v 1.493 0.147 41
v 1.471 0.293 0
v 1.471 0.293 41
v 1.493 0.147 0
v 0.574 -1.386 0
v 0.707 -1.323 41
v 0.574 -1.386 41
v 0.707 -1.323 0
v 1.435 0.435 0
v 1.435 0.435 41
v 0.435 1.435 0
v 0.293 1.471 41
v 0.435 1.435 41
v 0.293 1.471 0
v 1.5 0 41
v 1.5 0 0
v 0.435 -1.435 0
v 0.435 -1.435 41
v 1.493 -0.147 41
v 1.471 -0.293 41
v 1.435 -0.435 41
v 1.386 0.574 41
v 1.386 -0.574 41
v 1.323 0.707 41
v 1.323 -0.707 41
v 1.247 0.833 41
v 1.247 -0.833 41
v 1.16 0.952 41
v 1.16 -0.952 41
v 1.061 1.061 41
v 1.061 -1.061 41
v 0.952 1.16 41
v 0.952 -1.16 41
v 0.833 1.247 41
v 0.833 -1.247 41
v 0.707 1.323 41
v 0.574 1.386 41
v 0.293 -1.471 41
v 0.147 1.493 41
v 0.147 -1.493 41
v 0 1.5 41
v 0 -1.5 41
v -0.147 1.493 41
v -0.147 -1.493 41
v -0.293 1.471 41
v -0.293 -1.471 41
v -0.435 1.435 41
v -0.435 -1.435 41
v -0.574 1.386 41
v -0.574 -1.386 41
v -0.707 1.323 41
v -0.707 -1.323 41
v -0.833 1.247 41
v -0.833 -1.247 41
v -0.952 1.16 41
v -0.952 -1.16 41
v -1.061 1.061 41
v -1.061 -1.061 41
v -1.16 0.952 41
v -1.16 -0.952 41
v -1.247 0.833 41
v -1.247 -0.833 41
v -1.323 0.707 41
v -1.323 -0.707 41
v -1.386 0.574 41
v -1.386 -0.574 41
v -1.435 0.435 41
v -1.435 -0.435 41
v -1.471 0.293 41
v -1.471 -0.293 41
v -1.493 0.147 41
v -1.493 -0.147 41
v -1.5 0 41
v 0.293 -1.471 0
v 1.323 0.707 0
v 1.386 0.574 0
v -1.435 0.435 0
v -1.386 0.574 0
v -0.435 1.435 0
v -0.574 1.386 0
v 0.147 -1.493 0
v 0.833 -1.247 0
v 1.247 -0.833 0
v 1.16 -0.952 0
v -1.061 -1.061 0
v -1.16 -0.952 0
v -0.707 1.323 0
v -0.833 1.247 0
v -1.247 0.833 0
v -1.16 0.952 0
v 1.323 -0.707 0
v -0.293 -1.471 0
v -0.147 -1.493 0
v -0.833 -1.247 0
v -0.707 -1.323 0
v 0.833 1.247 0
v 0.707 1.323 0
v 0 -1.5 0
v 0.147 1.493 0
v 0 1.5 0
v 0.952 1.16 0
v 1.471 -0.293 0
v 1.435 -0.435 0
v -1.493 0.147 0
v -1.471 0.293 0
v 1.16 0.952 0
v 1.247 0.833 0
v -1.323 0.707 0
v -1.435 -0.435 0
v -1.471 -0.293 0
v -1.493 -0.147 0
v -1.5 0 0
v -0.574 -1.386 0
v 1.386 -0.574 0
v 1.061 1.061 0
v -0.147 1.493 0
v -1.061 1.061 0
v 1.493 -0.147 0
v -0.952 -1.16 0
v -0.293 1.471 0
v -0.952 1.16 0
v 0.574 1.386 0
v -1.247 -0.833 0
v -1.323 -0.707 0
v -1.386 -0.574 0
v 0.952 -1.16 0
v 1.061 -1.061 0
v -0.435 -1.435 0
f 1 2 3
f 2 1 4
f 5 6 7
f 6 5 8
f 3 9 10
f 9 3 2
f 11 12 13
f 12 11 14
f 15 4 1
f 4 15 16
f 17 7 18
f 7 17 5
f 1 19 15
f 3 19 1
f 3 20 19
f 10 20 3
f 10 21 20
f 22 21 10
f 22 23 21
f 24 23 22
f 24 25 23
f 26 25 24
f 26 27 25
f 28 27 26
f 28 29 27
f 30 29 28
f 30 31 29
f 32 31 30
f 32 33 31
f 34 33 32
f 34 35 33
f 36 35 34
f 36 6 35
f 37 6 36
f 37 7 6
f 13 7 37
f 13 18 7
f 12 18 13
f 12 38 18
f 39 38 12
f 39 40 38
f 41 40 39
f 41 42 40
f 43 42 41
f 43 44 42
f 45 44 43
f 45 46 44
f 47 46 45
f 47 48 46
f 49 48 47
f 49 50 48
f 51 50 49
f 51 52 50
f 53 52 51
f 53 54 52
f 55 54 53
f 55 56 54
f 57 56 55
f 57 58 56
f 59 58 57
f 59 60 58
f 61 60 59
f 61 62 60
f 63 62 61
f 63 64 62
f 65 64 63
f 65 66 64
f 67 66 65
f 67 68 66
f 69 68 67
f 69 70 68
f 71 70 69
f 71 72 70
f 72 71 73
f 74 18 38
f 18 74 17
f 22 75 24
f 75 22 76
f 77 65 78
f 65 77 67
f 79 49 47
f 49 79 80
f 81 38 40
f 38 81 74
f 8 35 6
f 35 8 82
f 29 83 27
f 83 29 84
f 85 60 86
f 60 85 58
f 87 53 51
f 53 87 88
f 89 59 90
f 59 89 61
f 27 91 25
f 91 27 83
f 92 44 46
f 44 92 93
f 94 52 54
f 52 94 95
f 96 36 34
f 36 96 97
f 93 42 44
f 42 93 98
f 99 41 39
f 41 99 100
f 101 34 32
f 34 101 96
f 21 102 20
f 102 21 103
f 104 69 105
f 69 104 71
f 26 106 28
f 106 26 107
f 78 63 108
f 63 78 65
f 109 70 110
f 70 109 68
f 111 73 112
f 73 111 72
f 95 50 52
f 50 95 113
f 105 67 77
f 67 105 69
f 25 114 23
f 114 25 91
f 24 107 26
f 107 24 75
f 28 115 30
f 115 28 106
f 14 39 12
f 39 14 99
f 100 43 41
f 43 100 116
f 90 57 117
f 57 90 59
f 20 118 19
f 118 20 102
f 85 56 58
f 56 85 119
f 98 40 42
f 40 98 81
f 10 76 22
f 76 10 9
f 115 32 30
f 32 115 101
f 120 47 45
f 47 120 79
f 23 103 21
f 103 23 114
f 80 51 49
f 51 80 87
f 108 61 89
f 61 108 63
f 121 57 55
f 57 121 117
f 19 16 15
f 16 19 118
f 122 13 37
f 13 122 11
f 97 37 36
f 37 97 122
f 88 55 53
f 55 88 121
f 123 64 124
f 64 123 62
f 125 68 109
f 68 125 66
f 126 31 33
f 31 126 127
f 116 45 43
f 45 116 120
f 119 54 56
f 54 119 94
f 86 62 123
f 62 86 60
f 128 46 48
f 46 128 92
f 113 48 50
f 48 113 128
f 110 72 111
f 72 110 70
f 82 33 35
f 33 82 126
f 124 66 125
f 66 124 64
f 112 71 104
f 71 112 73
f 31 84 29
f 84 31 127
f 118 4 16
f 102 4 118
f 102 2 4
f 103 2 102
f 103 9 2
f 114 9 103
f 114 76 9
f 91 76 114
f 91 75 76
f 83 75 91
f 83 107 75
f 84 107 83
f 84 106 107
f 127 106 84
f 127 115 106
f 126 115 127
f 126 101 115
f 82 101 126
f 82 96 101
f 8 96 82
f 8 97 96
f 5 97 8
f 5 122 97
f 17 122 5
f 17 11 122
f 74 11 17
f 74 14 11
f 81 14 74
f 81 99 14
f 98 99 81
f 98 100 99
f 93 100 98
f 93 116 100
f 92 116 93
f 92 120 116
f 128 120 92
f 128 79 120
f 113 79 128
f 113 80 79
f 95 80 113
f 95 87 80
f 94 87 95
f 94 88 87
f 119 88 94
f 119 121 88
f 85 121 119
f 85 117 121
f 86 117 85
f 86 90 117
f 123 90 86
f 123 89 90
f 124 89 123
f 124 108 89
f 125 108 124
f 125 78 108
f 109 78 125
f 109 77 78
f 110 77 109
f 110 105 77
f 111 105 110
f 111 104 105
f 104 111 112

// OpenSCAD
// Hose-barb Reducer Design
// Units: millimetres
// Orientation: Standing upright along Z, resting on XY plane at z=0

// --- Dimensions ---
// Main bore diameter (constant through the part)
$main_bore_d = 3.0;
$main_bore_r = $main_bore_d / 2;

// Section 1: 8mm Tubing Barbs (z = 0 to 20)
$z_start_1 = 0;
$z_end_1 = 20;
$barb_height_1 = 10;
$barb_od_bottom_1 = 7.5;
$barb_od_top_1 = 9.5;
$barb_count_1 = 2;

// Section 2: Collar (z = 20 to 25)
$z_start_2 = 20;
$z_end_2 = 25;
$collar_od = 12.0;
$collar_r = $collar_od / 2;

// Section 3: 5mm Tubing Barbs (z = 25 to 41)
$z_start_3 = 25;
$z_end_3 = 41;
$barb_height_3 = 8;
$barb_od_bottom_3 = 6.5;
$barb_od_top_3 = 5.0;
$barb_count_3 = 2;

// --- Geometry Generation ---

module build_part() {
    // Define the profile points for the outer shell in the XZ plane.
    // X = Radius, Z = Height.
    // The profile traces the outer boundary and the inner "steps" to create the solid volume.
    
    // Barb 1 (z=0 to 10): R 3.75 -> 4.75. Step down to 3.75 at z=10.
    // Barb 2 (z=10 to 20): R 3.75 -> 4.75. Step down to 3.75 at z=20.
    // Collar (z=20 to 25): R 6.0.
    // Barb 3 (z=25 to 33): R 3.25 -> 2.5. Step down to 3.25 at z=33.
    // Barb 4 (z=33 to 41): R 3.25 -> 2.5. Step down to 3.25 at z=41.
    
    $profile_pts = [
        // Start at bottom of Barb 1
        [$barb_od_bottom_1 / 2, $z_start_1],
        // Top of Barb 1
        [$barb_od_top_1 / 2, $z_start_1 + $barb_height_1],
        // Step down to base of Barb 2
        [$barb_od_bottom_1 / 2, $z_start_1 + $barb_height_1],
        // Top of Barb 2
        [$barb_od_top_1 / 2, $z_end_1],
        // Step down to base of Collar
        [$barb_od_bottom_1 / 2, $z_end_1],
        // Outer edge of Collar
        [$collar_r, $z_end_1],
        [$collar_r, $z_end_2],
        // Step down to base of Barb 3
        [$barb_od_bottom_3 / 2, $z_end_2],
        // Top of Barb 3
        [$barb_od_top_3 / 2, $z_end_2 + $barb_height_3],
        // Step down to base of Barb 4
        [$barb_od_bottom_3 / 2, $z_end_2 + $barb_height_3],
        // Top of Barb 4
        [$barb_od_top_3 / 2, $z_end_3],
        // Step down to end
        [$barb_od_bottom_3 / 2, $z_end_3],
        // Close loop back to start
        [$barb_od_bottom_1 / 2, $z_start_1]
    ];
    
    // Create the outer shell using linear_extrude
    // We use a polygon that traces the full perimeter (up the outside, down the steps)
    // to ensure the volume is solid.
    linear_extrude(height=$z_end_3, center=false)
    polygon(points=$profile_pts, convexity=1);
    
    // Subtract the central bore
    difference() {
        // The main body is the result of the linear_extrude above.
        // We need to subtract a cylinder of radius $main_bore_r from z=0 to z=$z_end_3.
        // Since we are inside a difference(), we define the cutter.
        cylinder(
            h=$z_end_3,
            r=$main_bore_r,
            center=false
        );
    }
}

// Set global resolution for curved surfaces (though this part is mostly linear, 
// good practice for any potential curves or future edits)
$fn = 64;

// Build the part
build_part();
